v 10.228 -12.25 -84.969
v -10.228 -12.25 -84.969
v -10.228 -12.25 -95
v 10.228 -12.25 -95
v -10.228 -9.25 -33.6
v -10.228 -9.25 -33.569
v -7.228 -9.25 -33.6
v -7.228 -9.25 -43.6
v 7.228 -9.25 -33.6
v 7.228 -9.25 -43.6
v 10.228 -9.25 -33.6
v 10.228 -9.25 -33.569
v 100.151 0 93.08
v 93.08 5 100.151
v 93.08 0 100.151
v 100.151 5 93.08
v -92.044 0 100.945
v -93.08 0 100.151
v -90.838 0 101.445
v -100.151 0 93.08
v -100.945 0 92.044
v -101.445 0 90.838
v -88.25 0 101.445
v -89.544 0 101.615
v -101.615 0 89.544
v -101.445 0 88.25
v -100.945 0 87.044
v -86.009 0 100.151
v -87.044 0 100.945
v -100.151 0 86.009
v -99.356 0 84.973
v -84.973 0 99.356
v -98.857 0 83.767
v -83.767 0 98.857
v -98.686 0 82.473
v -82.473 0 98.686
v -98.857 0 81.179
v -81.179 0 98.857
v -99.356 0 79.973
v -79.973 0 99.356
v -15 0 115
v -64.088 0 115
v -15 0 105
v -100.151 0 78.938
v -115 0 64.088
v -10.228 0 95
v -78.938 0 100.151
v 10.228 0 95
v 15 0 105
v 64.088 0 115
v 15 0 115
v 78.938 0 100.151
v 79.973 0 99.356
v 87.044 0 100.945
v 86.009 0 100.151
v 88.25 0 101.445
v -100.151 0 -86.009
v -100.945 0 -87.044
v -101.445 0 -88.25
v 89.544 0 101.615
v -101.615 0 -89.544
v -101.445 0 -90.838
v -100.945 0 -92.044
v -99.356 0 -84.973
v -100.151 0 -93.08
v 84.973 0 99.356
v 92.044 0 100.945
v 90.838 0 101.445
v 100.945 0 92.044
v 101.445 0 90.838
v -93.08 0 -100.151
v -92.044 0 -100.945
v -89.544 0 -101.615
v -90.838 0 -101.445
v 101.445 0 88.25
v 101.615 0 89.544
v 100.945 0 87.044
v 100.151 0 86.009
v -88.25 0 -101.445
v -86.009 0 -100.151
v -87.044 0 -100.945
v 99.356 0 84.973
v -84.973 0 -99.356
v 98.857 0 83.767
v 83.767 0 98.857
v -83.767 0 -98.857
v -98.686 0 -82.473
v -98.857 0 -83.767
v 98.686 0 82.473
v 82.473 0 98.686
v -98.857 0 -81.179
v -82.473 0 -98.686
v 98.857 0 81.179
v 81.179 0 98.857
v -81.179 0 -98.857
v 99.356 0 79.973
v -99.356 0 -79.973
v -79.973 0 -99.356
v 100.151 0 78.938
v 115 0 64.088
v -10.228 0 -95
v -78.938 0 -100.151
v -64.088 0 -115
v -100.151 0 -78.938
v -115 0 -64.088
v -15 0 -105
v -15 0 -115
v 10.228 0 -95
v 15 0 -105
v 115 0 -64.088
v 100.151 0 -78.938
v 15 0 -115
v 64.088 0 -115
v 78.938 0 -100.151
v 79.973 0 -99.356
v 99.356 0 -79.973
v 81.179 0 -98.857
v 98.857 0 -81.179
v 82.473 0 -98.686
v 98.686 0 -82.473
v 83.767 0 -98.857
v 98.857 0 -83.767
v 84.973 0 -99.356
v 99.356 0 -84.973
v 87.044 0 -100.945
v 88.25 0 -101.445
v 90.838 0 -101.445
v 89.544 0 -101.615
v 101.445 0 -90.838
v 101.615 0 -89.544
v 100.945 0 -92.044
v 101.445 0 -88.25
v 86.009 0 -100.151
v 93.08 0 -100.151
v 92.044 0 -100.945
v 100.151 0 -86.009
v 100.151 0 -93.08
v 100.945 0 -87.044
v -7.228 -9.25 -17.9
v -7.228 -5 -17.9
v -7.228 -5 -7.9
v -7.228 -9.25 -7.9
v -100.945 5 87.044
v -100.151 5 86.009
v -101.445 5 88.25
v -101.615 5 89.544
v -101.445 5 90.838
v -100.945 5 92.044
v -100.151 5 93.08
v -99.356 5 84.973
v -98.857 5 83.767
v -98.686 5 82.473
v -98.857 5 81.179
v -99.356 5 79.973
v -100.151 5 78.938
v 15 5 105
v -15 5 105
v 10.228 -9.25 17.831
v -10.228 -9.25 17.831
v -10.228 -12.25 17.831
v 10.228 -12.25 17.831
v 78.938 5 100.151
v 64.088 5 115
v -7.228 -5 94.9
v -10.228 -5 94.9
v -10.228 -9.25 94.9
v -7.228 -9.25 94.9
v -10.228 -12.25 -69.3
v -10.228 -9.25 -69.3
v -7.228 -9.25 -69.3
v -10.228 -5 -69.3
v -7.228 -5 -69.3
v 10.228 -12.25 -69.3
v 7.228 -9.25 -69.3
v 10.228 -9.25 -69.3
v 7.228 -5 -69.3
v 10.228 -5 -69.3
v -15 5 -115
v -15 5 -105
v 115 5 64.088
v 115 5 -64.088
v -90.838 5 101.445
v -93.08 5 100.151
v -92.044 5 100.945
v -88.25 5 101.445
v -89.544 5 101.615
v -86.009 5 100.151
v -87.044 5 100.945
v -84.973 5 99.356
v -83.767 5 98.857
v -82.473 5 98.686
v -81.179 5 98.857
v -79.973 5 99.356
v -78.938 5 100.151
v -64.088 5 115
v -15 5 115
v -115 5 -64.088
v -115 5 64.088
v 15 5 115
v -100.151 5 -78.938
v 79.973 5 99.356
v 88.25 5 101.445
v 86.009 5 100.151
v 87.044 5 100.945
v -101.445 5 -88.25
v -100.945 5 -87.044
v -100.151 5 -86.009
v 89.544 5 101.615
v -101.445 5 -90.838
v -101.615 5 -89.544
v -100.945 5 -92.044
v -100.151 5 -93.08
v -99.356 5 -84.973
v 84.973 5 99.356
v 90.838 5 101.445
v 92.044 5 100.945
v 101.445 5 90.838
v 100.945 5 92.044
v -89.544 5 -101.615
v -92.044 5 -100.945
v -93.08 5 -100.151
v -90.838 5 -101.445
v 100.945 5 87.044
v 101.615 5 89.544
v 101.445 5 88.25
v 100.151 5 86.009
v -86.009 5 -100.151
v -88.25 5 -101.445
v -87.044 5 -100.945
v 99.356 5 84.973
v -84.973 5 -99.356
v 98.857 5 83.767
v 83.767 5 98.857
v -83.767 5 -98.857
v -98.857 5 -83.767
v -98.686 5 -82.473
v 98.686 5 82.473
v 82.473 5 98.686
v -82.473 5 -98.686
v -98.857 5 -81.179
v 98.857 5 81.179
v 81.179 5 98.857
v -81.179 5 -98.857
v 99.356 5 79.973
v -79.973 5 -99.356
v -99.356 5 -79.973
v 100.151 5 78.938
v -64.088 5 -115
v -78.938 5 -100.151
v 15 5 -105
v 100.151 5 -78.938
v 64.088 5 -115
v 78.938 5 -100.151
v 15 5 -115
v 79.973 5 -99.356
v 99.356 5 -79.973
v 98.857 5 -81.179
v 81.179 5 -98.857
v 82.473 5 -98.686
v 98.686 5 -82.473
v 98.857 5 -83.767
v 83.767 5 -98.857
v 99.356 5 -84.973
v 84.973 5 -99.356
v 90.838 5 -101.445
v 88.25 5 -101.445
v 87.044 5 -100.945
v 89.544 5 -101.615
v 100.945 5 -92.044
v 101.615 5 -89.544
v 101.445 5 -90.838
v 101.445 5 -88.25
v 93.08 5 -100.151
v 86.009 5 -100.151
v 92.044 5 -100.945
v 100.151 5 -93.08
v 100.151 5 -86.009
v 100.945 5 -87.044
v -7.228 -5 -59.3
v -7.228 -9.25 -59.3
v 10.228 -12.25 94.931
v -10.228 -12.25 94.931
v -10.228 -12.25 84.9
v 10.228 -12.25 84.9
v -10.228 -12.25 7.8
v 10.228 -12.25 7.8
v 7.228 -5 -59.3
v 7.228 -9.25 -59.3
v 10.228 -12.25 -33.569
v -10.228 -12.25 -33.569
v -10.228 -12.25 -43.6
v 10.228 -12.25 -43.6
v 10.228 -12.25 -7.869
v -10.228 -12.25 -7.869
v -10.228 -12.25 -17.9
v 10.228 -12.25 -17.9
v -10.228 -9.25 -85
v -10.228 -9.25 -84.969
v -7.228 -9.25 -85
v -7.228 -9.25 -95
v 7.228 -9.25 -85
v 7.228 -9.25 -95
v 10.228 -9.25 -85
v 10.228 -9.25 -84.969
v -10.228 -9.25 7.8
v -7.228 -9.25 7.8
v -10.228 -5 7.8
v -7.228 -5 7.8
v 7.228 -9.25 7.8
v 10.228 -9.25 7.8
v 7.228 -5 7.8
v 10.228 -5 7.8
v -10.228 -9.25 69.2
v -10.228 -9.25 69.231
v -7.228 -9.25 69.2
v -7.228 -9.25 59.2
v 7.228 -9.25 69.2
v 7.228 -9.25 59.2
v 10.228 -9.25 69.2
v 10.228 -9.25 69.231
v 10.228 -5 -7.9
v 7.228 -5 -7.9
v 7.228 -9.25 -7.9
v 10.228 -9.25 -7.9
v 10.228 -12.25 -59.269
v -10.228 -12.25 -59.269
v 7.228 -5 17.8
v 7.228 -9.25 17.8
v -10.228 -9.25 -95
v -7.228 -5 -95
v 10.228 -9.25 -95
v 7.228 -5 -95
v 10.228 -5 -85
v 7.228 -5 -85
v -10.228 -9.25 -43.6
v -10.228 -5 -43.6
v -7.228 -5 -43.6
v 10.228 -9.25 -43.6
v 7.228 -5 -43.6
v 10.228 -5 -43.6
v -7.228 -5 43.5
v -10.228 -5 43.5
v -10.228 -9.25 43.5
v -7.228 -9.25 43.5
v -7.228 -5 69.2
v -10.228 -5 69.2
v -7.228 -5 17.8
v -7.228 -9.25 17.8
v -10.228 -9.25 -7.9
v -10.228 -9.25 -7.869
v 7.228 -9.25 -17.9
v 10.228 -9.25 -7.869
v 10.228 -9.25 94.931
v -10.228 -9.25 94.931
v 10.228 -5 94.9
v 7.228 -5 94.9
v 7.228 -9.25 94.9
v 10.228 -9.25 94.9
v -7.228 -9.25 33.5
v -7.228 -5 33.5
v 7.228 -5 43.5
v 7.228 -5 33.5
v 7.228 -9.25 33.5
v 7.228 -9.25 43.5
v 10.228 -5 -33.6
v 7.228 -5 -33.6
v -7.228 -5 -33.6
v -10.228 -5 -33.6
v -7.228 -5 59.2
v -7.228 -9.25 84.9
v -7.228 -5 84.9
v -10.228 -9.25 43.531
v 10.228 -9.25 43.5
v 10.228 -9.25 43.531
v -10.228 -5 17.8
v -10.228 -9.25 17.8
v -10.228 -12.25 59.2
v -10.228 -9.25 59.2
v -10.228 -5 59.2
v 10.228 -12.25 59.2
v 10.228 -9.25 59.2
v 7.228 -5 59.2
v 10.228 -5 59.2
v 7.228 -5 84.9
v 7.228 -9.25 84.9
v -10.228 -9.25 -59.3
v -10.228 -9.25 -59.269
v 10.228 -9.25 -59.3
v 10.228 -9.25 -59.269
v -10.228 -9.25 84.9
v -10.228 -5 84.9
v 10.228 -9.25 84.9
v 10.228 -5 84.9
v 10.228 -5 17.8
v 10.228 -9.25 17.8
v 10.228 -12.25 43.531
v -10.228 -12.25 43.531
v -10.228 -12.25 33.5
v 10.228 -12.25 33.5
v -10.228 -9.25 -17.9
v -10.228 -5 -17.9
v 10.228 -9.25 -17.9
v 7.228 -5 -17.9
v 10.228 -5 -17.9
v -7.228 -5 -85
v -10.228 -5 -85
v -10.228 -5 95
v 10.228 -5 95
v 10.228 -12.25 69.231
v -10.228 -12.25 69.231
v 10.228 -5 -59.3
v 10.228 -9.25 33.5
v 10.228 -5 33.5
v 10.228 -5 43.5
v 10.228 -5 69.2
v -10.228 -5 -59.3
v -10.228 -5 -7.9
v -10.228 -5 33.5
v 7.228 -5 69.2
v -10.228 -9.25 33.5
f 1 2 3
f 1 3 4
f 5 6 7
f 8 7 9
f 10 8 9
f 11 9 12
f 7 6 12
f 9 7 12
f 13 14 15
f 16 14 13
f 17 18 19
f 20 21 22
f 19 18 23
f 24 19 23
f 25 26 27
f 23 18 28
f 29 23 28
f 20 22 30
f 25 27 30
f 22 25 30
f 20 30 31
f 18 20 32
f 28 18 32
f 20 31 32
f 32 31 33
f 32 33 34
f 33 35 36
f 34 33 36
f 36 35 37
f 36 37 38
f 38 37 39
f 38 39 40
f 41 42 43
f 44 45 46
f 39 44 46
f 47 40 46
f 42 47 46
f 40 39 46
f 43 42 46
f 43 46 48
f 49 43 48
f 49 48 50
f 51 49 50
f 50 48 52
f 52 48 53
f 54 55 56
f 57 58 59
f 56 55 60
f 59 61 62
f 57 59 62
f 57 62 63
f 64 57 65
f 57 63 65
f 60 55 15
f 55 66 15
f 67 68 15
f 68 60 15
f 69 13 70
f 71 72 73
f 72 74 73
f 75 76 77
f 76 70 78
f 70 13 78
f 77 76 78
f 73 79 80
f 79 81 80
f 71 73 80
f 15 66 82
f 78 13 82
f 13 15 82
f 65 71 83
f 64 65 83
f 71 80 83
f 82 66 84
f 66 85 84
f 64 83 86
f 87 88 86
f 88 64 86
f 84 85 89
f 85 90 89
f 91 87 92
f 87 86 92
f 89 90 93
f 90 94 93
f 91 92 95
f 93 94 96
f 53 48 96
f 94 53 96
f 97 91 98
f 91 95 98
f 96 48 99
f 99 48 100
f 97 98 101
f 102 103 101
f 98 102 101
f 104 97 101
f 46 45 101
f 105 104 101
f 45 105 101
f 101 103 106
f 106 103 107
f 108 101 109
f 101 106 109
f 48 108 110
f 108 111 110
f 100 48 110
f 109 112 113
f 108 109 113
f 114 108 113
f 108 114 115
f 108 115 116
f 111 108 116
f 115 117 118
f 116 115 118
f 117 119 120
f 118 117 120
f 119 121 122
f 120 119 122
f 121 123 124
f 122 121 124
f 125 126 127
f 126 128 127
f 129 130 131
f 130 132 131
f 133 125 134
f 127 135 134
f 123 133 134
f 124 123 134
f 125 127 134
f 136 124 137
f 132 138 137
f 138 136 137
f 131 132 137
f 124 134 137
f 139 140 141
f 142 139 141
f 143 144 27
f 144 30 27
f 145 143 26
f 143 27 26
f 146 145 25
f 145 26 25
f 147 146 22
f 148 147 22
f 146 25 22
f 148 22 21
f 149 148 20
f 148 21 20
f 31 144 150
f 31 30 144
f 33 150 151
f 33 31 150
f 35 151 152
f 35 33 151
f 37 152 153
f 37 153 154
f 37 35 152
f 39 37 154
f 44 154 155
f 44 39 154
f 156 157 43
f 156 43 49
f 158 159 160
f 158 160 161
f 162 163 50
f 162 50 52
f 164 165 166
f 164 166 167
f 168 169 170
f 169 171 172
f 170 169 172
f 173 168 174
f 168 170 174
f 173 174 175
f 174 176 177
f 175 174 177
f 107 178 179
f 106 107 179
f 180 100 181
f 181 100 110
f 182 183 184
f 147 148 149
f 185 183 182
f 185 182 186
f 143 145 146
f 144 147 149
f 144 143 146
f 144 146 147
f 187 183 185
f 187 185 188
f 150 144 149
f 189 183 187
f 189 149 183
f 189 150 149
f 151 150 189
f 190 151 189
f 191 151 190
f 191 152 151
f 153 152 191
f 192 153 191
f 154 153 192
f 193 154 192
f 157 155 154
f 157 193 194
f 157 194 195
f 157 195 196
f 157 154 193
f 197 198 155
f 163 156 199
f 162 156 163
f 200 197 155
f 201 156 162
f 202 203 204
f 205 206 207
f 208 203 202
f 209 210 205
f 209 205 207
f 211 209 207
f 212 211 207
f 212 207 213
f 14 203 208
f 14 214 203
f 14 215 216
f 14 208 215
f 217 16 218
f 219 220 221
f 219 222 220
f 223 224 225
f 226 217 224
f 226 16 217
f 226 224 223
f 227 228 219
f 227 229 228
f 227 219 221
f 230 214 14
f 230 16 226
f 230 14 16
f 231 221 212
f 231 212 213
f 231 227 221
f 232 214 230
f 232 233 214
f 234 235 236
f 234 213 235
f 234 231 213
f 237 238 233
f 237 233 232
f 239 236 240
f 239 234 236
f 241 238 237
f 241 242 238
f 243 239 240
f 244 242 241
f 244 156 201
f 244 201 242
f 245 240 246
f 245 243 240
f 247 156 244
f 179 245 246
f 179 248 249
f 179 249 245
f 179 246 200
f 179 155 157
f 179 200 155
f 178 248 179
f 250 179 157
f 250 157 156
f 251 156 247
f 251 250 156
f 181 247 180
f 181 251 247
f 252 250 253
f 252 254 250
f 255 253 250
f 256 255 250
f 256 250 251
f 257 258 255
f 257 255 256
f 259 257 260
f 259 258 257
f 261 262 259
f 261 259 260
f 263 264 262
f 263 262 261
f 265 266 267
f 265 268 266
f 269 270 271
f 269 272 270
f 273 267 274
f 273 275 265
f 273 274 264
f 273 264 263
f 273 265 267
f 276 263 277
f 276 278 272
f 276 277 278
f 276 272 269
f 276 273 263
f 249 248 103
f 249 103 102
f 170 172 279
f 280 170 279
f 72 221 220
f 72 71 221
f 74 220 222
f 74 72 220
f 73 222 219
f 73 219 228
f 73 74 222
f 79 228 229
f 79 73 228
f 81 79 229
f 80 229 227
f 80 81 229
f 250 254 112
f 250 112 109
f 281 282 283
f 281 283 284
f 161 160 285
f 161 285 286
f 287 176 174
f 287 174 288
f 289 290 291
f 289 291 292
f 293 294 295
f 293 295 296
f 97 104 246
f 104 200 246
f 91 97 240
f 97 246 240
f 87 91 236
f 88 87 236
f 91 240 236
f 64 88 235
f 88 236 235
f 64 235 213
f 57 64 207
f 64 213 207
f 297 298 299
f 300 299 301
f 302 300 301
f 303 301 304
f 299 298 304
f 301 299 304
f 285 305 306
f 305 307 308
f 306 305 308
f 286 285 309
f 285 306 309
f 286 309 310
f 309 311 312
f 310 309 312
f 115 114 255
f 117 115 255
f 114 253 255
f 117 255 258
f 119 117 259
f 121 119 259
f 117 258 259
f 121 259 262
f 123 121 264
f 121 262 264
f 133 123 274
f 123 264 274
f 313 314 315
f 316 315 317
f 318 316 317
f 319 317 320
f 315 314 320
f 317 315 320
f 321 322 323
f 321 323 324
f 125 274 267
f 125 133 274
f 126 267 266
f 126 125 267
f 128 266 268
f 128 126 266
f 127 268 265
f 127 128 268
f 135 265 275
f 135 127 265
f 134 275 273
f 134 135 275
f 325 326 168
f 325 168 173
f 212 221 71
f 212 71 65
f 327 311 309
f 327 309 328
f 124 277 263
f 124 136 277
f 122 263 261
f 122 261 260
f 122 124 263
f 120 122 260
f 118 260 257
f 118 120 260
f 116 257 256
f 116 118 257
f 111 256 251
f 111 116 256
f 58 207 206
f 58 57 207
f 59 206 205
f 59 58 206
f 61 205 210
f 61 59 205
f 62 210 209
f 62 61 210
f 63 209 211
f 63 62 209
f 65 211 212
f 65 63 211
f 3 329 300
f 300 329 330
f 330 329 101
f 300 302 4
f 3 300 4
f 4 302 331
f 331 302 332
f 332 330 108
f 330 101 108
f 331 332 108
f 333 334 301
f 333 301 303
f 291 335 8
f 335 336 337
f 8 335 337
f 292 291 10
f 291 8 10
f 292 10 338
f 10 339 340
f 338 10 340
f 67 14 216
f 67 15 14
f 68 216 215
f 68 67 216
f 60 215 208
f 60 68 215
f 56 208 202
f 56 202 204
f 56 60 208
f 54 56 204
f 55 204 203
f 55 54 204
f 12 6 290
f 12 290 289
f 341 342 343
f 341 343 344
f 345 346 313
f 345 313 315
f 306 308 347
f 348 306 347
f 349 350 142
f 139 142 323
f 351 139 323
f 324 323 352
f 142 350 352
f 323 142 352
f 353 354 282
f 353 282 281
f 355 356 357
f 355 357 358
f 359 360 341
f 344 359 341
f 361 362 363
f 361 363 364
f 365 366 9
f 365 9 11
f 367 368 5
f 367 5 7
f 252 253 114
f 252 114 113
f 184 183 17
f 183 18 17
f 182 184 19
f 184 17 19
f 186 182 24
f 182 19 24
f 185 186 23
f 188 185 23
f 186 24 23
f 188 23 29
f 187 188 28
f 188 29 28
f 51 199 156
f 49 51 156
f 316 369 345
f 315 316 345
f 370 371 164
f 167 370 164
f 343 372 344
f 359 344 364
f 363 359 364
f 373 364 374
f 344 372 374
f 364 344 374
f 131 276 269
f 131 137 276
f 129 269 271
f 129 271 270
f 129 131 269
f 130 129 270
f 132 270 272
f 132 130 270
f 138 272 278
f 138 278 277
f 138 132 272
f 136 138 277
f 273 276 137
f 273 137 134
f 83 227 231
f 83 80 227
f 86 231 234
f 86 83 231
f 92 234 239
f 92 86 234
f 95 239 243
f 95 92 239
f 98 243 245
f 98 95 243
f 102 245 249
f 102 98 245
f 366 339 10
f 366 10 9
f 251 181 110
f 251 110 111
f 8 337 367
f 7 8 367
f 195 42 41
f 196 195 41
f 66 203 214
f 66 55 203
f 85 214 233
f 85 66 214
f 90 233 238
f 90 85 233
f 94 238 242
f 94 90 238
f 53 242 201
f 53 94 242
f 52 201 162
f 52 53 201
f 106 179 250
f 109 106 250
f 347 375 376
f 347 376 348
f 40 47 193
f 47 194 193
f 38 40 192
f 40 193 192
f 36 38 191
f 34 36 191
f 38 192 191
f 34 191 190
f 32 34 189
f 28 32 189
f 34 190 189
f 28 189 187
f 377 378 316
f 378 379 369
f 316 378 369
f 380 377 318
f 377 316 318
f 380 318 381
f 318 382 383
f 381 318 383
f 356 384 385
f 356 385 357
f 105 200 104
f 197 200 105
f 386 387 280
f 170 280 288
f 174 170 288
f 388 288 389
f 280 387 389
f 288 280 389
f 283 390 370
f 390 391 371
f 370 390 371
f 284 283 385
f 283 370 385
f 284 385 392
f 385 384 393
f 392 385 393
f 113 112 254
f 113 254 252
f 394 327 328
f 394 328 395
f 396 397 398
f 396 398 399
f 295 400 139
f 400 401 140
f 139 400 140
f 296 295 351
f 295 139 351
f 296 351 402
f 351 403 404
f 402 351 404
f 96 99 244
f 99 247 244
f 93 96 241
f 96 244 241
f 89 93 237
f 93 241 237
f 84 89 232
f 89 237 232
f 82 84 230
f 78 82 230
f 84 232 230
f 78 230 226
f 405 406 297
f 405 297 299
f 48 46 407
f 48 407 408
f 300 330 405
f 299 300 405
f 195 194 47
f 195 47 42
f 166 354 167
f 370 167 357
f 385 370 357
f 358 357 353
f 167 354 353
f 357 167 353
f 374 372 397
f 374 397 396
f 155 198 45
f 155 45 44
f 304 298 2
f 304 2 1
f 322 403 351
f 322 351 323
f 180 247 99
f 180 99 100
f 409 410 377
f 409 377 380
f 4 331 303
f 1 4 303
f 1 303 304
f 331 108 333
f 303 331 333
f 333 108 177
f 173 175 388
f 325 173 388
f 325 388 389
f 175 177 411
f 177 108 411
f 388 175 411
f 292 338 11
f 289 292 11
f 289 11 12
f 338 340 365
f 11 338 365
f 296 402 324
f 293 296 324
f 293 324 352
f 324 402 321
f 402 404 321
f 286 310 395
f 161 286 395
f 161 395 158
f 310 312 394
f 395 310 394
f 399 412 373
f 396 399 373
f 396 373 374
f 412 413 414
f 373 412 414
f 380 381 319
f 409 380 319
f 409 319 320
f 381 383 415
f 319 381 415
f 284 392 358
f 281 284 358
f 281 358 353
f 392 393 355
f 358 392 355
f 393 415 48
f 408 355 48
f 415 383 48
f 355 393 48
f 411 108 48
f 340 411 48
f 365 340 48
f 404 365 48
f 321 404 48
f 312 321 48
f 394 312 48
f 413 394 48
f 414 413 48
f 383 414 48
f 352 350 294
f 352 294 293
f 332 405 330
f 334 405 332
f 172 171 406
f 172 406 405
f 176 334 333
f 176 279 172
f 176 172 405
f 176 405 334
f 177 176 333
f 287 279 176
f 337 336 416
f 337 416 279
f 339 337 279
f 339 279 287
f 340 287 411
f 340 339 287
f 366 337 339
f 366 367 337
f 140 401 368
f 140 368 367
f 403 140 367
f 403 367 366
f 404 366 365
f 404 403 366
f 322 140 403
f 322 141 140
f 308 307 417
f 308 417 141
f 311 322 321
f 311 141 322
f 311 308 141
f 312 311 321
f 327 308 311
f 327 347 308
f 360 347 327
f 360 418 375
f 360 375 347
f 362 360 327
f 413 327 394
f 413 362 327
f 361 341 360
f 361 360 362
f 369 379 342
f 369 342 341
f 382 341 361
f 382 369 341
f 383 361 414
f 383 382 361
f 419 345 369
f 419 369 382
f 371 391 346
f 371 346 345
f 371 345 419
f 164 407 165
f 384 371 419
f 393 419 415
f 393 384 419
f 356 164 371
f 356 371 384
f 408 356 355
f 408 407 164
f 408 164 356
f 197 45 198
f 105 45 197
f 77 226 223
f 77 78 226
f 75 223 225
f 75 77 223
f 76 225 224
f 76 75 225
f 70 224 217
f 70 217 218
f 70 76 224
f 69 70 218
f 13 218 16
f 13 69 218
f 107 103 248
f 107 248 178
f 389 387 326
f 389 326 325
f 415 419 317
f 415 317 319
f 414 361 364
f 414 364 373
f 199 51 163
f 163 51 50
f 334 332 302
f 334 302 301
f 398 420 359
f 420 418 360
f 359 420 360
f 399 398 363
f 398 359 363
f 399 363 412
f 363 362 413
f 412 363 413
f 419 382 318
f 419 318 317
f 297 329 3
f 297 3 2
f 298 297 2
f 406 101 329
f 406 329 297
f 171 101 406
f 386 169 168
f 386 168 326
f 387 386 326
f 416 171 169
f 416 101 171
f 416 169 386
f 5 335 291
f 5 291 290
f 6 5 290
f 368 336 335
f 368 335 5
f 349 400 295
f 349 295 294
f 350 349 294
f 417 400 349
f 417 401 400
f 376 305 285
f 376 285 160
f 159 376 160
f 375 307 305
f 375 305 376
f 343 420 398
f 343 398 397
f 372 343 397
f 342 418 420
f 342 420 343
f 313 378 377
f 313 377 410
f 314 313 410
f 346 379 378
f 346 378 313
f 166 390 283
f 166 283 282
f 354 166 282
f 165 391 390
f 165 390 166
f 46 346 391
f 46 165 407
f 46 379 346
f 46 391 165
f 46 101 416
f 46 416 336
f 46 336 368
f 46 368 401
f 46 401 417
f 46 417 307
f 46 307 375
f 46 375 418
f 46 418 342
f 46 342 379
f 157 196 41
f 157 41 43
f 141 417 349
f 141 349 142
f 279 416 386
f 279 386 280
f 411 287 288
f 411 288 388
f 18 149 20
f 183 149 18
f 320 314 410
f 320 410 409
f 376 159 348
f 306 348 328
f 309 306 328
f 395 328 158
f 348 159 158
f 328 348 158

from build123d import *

# Parameters (mm, degrees)
SZKIC1_W                        = 230
SZKIC1_H                        = 230
DODANIE_WYCI_GNI_CIE1_DEPTH     = 5
WYTNIJ_WYCI_GNI_CIE1_DEPTH      = 163.711400953
ZAOKR_GLENIE2_R                 = 5
SZYK_KO_OWY1_COUNT              = 4
ZAOKR_GLENIE2_OF_SZYK_KO_OWY1_R = 5
SZKIC3_W                        = 30
SZKIC3_H                        = 10
WYTNIJ_WYCI_GNI_CIE2_DEPTH      = 163.711400953
SZKIC4_W                        = 20.455701668
SZKIC4_H                        = 190
DODANIE_WYCI_GNI_CIE2_DEPTH     = 5
SZKIC5_W                        = 3
SZKIC5_H                        = 10
DODANIE_WYCI_GNI_CIE3_DEPTH     = 4.25
SZKIC6_W                        = 20.455701668
SZKIC6_H                        = 10.031438373
DODANIE_WYCI_GNI_CIE4_DEPTH     = 3
SZYK_LINIOWY1_COUNT             = 8
SZYK_LINIOWY1_PITCH             = 25.7


with BuildPart() as part:
    # Szkic1 → Dodanie-wyciągnięcie1 (new body)
    with BuildSketch(Plane(origin=(0, 0, 0), x_dir=(1, 0, 0), z_dir=(0, 1, 0))):
        Rectangle(SZKIC1_W, SZKIC1_H)
    extrude(amount=DODANIE_WYCI_GNI_CIE1_DEPTH)

    # Szkic2 → Wytnij-wyciągnięcie1 (cut, symmetric)
    with BuildSketch(Plane(origin=(0, 5, 0), x_dir=(1, 0, 0), z_dir=(0, 1, 0))):
        Polygon((-115, 115), (-64.088311755, 115), (-82.473088065, 96.615223689), (-89.544155877, 103.686291501), (-103.686291501, 89.544155877), (-96.615223689, 82.473088065), (-115, 64.088311755), align=None)
    wytnij_wyci_gni_cie1 = extrude(amount=WYTNIJ_WYCI_GNI_CIE1_DEPTH, both=True, mode=Mode.SUBTRACT)

    # Zaokrąglenie2
    zaokr_glenie2_edges = [part.edges().sort_by_distance(p)[0] for p in [
        (-82.473088065, 2.5, -96.615223689),
        (-96.615223689, 2.5, -82.473088065),
    ]]
    fillet(zaokr_glenie2_edges, radius=ZAOKR_GLENIE2_R)
    zaokr_glenie2_2_edges = [part.edges().sort_by_distance(p)[0] for p in [
        (-89.544155877, 2.5, -103.686291501),
        (-103.686291501, 2.5, -89.544155877),
    ]]
    fillet(zaokr_glenie2_2_edges, radius=ZAOKR_GLENIE2_R - 0.0001)  # a hair under: the kernel refuses the full size

    # Szyk kołowy1: Wytnij-wyciągnięcie1 ×4 about axis
    szyk_ko_owy1_axis = Axis((0, 0, 0), (0, 1, 0))
    for i in range(1, SZYK_KO_OWY1_COUNT):
        add(wytnij_wyci_gni_cie1.rotate(szyk_ko_owy1_axis, i * 360 / SZYK_KO_OWY1_COUNT), mode=Mode.SUBTRACT)

    # Zaokrąglenie2 of Szyk kołowy1
    zaokr_glenie2_of_szyk_ko_owy1_edges = [part.edges().sort_by_distance(p)[0] for p in [
        (-96.615223689, 2.5, 82.473088065),
        (-82.473088065, 2.5, 96.615223689),
        (82.473088065, 2.5, 96.615223689),
        (96.615223689, 2.5, 82.473088065),
        (96.615223689, 2.5, -82.473088065),
        (82.473088065, 2.5, -96.615223689),
    ]]
    fillet(zaokr_glenie2_of_szyk_ko_owy1_edges, radius=ZAOKR_GLENIE2_OF_SZYK_KO_OWY1_R)
    zaokr_glenie2_of_szyk_ko_owy1_2_edges = [part.edges().sort_by_distance(p)[0] for p in [
        (-103.686291501, 2.5, 89.544155877),
        (-89.544155877, 2.5, 103.686291501),
        (89.544155877, 2.5, 103.686291501),
        (103.686291501, 2.5, 89.544155877),
        (103.686291501, 2.5, -89.544155877),
        (89.544155877, 2.5, -103.686291501),
    ]]
    fillet(zaokr_glenie2_of_szyk_ko_owy1_2_edges, radius=ZAOKR_GLENIE2_OF_SZYK_KO_OWY1_R - 0.0001)  # a hair under: the kernel refuses the full size

    # Szkic3 → Wytnij-wyciągnięcie2 (cut, through all)
    with BuildSketch(Plane(origin=(0, 5, 0), x_dir=(1, 0, 0), z_dir=(0, 1, 0))):
        with Locations((0, -110)):
            Rectangle(SZKIC3_W, SZKIC3_H)
    wytnij_wyci_gni_cie2 = extrude(amount=-WYTNIJ_WYCI_GNI_CIE2_DEPTH, mode=Mode.SUBTRACT)

    # Lustro1: Wytnij-wyciągnięcie2 across plane
    add(wytnij_wyci_gni_cie2.mirror(Plane.XY), mode=Mode.SUBTRACT)

    # Szkic4 → Dodanie-wyciągnięcie2 (add)
    with BuildSketch(Plane.XZ):
        Rectangle(SZKIC4_W, SZKIC4_H)
    extrude(amount=DODANIE_WYCI_GNI_CIE2_DEPTH)

    # Szkic5 → Dodanie-wyciągnięcie3 (add)
    with BuildSketch(Plane.XZ.offset(5)):
        with Locations((8.727850834, -90)):
            Rectangle(SZKIC5_W, SZKIC5_H)
        with Locations((-8.727850834, -90)):
            Rectangle(SZKIC5_W, SZKIC5_H)
    dodanie_wyci_gni_cie3 = extrude(amount=DODANIE_WYCI_GNI_CIE3_DEPTH)

    # Szkic6 → Dodanie-wyciągnięcie4 (add)
    with BuildSketch(Plane.XZ.offset(9.25)):
        with Locations((0, -89.984280813)):
            Rectangle(SZKIC6_W, SZKIC6_H)
    dodanie_wyci_gni_cie4 = extrude(amount=DODANIE_WYCI_GNI_CIE4_DEPTH)

    # Szyk liniowy1: Dodanie-wyciągnięcie3, Dodanie-wyciągnięcie4 ×8
    with Locations(*[(0, 0, i * SZYK_LINIOWY1_PITCH) for i in range(1, SZYK_LINIOWY1_COUNT)]):
        add(dodanie_wyci_gni_cie3)
        add(dodanie_wyci_gni_cie4)


solid = part.part
